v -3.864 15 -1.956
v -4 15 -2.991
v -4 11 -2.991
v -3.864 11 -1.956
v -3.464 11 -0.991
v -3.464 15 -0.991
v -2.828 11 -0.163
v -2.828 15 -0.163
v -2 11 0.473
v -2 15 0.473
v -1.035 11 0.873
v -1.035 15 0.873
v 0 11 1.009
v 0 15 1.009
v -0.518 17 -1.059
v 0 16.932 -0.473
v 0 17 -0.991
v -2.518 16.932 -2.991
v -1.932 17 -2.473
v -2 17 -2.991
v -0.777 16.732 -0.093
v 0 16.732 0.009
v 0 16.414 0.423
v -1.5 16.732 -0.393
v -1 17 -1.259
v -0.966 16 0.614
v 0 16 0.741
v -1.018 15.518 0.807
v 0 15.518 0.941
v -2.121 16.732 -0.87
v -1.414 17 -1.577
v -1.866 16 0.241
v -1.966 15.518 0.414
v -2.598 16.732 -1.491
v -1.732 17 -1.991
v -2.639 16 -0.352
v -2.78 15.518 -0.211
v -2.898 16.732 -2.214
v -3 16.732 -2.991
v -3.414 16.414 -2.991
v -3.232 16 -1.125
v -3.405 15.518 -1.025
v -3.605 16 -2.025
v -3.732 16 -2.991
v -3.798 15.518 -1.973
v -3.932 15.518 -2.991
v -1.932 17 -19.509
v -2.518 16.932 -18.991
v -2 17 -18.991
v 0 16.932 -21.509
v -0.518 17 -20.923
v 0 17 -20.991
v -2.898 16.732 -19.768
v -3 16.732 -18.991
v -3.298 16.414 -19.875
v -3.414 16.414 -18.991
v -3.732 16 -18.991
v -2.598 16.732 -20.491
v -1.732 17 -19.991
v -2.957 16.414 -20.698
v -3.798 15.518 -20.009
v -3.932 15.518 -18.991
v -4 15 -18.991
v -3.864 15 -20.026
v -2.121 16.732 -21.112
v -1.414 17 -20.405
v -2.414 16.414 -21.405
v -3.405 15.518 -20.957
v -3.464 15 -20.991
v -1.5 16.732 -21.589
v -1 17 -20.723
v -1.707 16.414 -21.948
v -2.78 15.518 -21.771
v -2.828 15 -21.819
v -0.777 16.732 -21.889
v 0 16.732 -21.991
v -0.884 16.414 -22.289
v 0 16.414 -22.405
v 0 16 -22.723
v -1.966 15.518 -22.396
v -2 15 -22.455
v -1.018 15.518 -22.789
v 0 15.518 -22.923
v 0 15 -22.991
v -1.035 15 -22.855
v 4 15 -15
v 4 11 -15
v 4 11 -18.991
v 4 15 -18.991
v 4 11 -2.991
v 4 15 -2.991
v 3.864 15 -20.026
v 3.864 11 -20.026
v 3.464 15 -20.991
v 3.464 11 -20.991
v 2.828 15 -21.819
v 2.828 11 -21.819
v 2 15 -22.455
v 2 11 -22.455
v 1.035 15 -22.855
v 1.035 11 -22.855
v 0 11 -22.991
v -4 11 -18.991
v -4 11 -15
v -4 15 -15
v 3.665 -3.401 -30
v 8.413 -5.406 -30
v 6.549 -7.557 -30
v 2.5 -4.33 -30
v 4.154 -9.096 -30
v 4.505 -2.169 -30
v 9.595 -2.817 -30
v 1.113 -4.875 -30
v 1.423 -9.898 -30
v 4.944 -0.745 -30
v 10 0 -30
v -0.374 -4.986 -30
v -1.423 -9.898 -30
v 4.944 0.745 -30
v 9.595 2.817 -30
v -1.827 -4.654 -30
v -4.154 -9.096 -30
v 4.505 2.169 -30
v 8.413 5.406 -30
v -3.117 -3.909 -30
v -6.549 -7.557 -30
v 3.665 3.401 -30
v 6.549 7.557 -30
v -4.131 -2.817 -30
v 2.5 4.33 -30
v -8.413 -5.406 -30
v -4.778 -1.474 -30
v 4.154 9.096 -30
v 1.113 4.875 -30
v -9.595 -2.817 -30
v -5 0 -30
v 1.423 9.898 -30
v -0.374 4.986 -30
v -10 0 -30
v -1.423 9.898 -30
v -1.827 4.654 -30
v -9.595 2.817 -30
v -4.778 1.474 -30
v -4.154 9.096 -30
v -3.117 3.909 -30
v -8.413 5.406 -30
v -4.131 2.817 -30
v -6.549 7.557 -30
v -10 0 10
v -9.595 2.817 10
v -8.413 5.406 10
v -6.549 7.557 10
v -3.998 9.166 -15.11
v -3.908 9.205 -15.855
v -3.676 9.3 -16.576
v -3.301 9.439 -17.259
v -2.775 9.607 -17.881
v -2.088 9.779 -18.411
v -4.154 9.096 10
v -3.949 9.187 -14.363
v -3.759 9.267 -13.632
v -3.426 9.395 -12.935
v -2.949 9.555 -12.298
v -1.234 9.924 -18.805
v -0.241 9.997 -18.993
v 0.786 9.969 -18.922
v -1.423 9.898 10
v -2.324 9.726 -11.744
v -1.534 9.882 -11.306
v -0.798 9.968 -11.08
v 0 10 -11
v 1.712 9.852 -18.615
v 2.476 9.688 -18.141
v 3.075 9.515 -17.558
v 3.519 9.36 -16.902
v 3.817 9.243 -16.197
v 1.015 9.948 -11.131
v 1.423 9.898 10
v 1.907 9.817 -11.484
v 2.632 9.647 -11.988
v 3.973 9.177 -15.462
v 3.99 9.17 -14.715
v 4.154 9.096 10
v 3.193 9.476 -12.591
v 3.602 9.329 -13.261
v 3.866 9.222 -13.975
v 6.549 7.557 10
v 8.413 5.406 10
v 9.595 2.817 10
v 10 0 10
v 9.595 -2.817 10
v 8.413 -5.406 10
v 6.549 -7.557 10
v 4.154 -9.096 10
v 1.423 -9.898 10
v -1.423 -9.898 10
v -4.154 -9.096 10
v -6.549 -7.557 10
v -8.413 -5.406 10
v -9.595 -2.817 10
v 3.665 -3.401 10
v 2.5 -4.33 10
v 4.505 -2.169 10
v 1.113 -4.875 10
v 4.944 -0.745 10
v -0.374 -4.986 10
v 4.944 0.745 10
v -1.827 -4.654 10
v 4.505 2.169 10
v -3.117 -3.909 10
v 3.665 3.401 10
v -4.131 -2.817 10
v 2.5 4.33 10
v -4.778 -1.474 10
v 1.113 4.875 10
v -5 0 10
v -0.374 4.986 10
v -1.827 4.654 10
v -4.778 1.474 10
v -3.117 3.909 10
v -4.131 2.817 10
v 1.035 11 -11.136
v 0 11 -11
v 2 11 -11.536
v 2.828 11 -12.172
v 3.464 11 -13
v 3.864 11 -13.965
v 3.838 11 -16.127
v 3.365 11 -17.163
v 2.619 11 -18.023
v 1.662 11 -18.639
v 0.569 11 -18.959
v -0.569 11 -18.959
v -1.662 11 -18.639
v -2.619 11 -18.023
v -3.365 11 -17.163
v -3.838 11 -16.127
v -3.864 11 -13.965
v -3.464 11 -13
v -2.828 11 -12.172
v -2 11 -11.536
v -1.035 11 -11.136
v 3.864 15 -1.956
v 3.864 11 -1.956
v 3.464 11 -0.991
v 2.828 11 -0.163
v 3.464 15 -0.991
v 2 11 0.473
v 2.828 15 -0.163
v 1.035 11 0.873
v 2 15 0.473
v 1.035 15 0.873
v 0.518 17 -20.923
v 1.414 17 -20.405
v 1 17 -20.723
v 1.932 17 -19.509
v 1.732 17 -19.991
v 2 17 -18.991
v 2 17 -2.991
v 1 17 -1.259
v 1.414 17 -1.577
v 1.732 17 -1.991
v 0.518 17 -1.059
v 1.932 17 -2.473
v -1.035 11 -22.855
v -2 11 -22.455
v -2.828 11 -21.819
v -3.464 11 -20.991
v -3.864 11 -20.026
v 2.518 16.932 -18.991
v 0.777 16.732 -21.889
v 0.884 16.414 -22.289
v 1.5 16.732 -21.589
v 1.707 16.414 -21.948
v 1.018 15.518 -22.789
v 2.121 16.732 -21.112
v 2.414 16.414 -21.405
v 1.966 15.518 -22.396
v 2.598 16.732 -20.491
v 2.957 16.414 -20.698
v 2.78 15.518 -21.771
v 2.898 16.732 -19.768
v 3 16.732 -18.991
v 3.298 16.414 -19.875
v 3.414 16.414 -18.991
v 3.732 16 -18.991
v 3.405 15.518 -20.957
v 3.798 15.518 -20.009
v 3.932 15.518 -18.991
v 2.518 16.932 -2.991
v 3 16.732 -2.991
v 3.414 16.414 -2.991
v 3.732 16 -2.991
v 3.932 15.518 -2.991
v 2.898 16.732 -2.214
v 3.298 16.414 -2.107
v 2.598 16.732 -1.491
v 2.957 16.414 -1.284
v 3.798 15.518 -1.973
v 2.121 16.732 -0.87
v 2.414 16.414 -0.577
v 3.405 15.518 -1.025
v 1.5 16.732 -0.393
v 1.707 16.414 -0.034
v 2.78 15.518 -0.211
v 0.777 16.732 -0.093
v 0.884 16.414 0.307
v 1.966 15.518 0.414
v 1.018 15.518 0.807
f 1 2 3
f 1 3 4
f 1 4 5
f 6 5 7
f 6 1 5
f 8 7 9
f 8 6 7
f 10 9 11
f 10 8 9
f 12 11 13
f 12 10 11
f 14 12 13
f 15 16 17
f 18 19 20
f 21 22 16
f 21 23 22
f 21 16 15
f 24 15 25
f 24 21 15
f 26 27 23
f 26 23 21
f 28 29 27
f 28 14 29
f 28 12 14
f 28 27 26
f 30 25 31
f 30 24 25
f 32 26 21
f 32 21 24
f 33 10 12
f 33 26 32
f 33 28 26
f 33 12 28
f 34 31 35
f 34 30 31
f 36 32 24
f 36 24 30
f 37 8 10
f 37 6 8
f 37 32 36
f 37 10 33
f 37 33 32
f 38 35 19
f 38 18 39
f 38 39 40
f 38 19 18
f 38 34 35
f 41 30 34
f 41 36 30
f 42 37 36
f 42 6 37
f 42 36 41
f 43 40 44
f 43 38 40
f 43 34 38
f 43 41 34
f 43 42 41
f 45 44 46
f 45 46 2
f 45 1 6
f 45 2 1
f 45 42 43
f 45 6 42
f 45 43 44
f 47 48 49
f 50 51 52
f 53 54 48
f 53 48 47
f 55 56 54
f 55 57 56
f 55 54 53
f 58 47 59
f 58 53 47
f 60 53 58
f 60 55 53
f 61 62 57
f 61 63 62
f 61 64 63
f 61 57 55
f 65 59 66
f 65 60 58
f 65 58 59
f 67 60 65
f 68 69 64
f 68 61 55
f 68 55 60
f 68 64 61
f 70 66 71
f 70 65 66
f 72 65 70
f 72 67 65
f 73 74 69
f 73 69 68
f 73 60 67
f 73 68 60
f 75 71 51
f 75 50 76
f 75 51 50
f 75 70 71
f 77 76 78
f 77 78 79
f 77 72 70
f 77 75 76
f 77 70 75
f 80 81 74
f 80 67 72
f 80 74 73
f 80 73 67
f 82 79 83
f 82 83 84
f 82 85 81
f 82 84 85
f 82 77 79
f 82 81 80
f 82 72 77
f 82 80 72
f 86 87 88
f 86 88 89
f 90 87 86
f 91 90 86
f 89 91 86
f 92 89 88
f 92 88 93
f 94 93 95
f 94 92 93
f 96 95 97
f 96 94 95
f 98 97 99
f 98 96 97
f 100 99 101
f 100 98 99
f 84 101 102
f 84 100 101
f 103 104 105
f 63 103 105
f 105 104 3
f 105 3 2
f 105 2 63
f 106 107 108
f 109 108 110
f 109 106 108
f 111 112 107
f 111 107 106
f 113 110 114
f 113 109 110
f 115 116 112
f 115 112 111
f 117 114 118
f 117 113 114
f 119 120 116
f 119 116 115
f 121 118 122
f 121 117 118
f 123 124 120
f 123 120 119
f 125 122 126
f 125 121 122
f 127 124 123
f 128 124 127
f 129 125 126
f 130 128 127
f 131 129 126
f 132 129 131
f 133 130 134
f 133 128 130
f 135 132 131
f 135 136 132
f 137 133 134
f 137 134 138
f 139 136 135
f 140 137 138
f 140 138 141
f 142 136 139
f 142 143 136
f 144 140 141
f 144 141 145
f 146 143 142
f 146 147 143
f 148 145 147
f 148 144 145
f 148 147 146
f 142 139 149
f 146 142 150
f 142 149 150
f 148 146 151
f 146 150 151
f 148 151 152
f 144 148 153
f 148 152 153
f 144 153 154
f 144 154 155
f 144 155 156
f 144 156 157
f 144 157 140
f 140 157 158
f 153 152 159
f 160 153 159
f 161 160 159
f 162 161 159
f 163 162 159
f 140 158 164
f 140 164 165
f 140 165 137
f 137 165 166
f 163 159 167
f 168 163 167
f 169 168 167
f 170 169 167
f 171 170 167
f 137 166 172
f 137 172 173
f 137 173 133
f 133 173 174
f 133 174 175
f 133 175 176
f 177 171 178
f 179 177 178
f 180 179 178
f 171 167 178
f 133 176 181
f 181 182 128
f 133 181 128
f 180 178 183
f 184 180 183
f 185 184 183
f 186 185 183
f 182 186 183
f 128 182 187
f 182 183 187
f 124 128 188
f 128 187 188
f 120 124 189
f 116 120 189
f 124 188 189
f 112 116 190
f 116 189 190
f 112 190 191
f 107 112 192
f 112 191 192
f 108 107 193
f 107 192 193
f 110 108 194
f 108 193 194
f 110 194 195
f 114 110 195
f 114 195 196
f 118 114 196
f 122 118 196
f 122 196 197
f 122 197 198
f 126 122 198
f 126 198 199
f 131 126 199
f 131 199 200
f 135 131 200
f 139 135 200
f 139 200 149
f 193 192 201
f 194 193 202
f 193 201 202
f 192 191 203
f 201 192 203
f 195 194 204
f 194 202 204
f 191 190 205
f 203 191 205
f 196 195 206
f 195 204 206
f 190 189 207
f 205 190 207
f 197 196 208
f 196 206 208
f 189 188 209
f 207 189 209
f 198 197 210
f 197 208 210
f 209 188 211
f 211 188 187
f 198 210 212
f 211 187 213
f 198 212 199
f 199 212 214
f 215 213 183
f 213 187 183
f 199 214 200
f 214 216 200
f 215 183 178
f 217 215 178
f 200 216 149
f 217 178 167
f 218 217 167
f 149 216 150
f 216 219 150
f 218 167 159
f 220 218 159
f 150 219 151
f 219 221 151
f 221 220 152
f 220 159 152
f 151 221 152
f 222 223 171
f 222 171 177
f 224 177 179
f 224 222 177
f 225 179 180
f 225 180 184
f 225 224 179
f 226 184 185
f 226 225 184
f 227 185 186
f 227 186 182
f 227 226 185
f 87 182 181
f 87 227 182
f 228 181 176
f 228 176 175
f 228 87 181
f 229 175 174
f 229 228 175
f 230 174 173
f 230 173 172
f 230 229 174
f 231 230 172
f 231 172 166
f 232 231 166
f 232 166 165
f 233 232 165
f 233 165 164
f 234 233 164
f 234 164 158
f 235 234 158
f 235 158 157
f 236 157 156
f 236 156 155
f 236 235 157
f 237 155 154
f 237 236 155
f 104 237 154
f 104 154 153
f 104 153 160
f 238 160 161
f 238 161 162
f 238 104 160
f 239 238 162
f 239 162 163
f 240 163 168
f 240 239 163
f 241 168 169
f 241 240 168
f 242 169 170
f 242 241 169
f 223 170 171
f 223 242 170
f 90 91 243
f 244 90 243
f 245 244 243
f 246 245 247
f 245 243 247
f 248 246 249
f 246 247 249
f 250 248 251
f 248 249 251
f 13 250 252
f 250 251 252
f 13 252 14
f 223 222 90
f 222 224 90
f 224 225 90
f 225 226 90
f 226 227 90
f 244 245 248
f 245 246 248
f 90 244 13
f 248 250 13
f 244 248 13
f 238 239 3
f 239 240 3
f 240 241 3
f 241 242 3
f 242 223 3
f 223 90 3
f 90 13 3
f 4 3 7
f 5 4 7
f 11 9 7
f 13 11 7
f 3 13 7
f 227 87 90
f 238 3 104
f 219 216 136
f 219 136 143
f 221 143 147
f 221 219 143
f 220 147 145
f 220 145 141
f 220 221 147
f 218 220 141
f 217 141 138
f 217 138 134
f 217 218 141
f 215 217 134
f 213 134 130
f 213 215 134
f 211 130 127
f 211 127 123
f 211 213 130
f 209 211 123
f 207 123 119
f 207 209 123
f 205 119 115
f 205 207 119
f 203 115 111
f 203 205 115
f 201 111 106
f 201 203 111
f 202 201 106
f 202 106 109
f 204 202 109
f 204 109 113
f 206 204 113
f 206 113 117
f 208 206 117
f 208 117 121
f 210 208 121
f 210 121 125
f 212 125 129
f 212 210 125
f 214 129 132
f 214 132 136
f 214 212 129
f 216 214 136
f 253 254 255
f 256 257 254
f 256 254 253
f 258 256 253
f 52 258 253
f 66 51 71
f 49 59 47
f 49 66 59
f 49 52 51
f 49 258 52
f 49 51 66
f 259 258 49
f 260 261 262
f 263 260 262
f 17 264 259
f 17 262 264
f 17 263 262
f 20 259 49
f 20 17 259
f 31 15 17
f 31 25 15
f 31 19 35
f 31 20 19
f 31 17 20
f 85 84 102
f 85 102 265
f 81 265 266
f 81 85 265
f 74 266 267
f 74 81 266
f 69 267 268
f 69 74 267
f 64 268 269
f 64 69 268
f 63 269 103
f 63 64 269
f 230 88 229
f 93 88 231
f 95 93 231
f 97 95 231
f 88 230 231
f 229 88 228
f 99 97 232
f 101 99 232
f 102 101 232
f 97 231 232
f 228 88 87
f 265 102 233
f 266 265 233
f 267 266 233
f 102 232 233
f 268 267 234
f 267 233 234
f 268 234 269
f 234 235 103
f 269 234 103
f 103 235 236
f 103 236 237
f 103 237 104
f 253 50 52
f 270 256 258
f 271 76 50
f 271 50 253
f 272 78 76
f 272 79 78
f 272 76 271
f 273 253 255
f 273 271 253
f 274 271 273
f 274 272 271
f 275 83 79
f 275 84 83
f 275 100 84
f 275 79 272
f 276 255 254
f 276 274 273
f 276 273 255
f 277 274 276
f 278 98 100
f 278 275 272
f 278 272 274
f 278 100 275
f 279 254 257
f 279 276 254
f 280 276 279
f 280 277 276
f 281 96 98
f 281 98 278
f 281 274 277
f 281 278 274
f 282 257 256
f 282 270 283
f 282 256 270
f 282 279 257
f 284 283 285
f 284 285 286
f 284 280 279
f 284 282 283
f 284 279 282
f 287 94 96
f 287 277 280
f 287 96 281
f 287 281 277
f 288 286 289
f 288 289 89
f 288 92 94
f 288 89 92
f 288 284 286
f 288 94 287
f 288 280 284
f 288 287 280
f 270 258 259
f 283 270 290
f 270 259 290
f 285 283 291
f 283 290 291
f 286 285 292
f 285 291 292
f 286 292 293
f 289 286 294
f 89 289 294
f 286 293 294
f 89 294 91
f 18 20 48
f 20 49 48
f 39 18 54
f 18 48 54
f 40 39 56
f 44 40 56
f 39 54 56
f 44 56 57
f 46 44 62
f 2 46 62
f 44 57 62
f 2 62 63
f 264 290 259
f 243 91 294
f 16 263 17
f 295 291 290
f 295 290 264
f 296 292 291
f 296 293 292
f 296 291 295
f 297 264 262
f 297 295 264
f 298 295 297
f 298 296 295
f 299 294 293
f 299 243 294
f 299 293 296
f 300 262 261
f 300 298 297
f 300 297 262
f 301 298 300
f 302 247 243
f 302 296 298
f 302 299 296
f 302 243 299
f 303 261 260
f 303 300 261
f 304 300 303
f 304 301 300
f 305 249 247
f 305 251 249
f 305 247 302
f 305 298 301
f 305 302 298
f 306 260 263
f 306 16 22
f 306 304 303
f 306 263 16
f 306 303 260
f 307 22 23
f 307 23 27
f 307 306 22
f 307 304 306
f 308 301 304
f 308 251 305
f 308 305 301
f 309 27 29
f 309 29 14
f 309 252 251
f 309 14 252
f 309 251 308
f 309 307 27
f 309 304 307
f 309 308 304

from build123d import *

# Parameters (mm, degrees)
EXTRUDE_THIN6_START      = -10
SKETCH10_R               = 10
SKETCH10_R_2             = 5
EXTRUDE_THIN6_DEPTH      = 40
BOSS_EXTRUDE3_REACH      = 42.311
BOSS_EXTRUDE3_END_RADIUS = 10
SKETCH11_R               = 4
SKETCH12_W               = 4.268669827
SKETCH12_H               = 50.716029666
CUT_EXTRUDE2_DEPTH       = 4
BOSS_EXTRUDE4_START      = -20
SKETCH13_W               = 8
SKETCH13_H               = 6
BOSS_EXTRUDE4_DEPTH      = 24
FILLET3_R                = 4
FILLET4_R                = 2


with BuildPart() as part:
    # Sketch10 → Extrude-Thin6 (new body)
    with BuildSketch(Plane(origin=(0, 0, 0), x_dir=(-1, 0, 0), z_dir=(0, 0, -1)).offset(EXTRUDE_THIN6_START)):
        Circle(SKETCH10_R)
        Circle(SKETCH10_R_2, mode=Mode.SUBTRACT)
    extrude(amount=EXTRUDE_THIN6_DEPTH)

    # Boss-Extrude3: up to this cylinder (the profile starts outside it)
    boss_extrude3_end = Plane(origin=(0, 0, -15), z_dir=(0, 0, 1)) * Cylinder(BOSS_EXTRUDE3_END_RADIUS, 105.622, mode=Mode.PRIVATE)
    # Sketch11 → Boss-Extrude3 (add, up to the surface)
    with BuildSketch(Plane(origin=(0, 15, 0), x_dir=(1, 0, 0), z_dir=(0, 1, 0)), mode=Mode.PRIVATE) as boss_extrude3_sk1:
        with Locations(Location((0, 15, 0), (0, 0, 270))):
            Circle(SKETCH11_R)
    boss_extrude3_tool1 = extrude(boss_extrude3_sk1.sketch, amount=-BOSS_EXTRUDE3_REACH, mode=Mode.PRIVATE) - boss_extrude3_end
    add(boss_extrude3_tool1.solids().sort_by_distance((0, 15, -15))[0])

    # Sketch12 → Cut-Extrude2 (cut)
    with BuildSketch(Plane(origin=(0, 15, 0), x_dir=(1, 0, 0), z_dir=(0, 1, 0))):
        with Locations((-1.865665086, 44.348981699)):
            Rectangle(SKETCH12_W, SKETCH12_H)
    extrude(amount=-CUT_EXTRUDE2_DEPTH, mode=Mode.SUBTRACT)

    # Sketch13 → Boss-Extrude4 (add)
    with BuildSketch(Plane(origin=(0, 0, -18.990966866), x_dir=(-1, 0, 0), z_dir=(0, 0, -1)).offset(BOSS_EXTRUDE4_START)):
        with Locations((0, 14)):
            Rectangle(SKETCH13_W, SKETCH13_H)
    extrude(amount=BOSS_EXTRUDE4_DEPTH)

    # Fillet3
    fillet3_edges = [part.edges().sort_by_distance(p)[0] for p in [
        (4, 14, -22.990966866),
        (-4, 14, 1.009033134),
        (4, 14, 1.009033134),
        (-4, 14, -22.990966866),
    ]]
    fillet(fillet3_edges, radius=FILLET3_R - 0.0001)  # a hair under: the kernel refuses the full size

    # Fillet4
    fillet4_edges = [part.edges().sort_by_distance(p)[0] for p in [
        (-4, 17, -10.990966866),
        (4, 17, -10.990966866),
        (2.828456414, 17, -21.81942328),
        (-2.828456414, 17, -21.81942328),
        (2.828456414, 17, -0.162510452),
        (-2.828456414, 17, -0.162510452),
    ]]
    fillet(fillet4_edges, radius=FILLET4_R - 0.0001)  # a hair under: the kernel refuses the full size


solid = part.part
